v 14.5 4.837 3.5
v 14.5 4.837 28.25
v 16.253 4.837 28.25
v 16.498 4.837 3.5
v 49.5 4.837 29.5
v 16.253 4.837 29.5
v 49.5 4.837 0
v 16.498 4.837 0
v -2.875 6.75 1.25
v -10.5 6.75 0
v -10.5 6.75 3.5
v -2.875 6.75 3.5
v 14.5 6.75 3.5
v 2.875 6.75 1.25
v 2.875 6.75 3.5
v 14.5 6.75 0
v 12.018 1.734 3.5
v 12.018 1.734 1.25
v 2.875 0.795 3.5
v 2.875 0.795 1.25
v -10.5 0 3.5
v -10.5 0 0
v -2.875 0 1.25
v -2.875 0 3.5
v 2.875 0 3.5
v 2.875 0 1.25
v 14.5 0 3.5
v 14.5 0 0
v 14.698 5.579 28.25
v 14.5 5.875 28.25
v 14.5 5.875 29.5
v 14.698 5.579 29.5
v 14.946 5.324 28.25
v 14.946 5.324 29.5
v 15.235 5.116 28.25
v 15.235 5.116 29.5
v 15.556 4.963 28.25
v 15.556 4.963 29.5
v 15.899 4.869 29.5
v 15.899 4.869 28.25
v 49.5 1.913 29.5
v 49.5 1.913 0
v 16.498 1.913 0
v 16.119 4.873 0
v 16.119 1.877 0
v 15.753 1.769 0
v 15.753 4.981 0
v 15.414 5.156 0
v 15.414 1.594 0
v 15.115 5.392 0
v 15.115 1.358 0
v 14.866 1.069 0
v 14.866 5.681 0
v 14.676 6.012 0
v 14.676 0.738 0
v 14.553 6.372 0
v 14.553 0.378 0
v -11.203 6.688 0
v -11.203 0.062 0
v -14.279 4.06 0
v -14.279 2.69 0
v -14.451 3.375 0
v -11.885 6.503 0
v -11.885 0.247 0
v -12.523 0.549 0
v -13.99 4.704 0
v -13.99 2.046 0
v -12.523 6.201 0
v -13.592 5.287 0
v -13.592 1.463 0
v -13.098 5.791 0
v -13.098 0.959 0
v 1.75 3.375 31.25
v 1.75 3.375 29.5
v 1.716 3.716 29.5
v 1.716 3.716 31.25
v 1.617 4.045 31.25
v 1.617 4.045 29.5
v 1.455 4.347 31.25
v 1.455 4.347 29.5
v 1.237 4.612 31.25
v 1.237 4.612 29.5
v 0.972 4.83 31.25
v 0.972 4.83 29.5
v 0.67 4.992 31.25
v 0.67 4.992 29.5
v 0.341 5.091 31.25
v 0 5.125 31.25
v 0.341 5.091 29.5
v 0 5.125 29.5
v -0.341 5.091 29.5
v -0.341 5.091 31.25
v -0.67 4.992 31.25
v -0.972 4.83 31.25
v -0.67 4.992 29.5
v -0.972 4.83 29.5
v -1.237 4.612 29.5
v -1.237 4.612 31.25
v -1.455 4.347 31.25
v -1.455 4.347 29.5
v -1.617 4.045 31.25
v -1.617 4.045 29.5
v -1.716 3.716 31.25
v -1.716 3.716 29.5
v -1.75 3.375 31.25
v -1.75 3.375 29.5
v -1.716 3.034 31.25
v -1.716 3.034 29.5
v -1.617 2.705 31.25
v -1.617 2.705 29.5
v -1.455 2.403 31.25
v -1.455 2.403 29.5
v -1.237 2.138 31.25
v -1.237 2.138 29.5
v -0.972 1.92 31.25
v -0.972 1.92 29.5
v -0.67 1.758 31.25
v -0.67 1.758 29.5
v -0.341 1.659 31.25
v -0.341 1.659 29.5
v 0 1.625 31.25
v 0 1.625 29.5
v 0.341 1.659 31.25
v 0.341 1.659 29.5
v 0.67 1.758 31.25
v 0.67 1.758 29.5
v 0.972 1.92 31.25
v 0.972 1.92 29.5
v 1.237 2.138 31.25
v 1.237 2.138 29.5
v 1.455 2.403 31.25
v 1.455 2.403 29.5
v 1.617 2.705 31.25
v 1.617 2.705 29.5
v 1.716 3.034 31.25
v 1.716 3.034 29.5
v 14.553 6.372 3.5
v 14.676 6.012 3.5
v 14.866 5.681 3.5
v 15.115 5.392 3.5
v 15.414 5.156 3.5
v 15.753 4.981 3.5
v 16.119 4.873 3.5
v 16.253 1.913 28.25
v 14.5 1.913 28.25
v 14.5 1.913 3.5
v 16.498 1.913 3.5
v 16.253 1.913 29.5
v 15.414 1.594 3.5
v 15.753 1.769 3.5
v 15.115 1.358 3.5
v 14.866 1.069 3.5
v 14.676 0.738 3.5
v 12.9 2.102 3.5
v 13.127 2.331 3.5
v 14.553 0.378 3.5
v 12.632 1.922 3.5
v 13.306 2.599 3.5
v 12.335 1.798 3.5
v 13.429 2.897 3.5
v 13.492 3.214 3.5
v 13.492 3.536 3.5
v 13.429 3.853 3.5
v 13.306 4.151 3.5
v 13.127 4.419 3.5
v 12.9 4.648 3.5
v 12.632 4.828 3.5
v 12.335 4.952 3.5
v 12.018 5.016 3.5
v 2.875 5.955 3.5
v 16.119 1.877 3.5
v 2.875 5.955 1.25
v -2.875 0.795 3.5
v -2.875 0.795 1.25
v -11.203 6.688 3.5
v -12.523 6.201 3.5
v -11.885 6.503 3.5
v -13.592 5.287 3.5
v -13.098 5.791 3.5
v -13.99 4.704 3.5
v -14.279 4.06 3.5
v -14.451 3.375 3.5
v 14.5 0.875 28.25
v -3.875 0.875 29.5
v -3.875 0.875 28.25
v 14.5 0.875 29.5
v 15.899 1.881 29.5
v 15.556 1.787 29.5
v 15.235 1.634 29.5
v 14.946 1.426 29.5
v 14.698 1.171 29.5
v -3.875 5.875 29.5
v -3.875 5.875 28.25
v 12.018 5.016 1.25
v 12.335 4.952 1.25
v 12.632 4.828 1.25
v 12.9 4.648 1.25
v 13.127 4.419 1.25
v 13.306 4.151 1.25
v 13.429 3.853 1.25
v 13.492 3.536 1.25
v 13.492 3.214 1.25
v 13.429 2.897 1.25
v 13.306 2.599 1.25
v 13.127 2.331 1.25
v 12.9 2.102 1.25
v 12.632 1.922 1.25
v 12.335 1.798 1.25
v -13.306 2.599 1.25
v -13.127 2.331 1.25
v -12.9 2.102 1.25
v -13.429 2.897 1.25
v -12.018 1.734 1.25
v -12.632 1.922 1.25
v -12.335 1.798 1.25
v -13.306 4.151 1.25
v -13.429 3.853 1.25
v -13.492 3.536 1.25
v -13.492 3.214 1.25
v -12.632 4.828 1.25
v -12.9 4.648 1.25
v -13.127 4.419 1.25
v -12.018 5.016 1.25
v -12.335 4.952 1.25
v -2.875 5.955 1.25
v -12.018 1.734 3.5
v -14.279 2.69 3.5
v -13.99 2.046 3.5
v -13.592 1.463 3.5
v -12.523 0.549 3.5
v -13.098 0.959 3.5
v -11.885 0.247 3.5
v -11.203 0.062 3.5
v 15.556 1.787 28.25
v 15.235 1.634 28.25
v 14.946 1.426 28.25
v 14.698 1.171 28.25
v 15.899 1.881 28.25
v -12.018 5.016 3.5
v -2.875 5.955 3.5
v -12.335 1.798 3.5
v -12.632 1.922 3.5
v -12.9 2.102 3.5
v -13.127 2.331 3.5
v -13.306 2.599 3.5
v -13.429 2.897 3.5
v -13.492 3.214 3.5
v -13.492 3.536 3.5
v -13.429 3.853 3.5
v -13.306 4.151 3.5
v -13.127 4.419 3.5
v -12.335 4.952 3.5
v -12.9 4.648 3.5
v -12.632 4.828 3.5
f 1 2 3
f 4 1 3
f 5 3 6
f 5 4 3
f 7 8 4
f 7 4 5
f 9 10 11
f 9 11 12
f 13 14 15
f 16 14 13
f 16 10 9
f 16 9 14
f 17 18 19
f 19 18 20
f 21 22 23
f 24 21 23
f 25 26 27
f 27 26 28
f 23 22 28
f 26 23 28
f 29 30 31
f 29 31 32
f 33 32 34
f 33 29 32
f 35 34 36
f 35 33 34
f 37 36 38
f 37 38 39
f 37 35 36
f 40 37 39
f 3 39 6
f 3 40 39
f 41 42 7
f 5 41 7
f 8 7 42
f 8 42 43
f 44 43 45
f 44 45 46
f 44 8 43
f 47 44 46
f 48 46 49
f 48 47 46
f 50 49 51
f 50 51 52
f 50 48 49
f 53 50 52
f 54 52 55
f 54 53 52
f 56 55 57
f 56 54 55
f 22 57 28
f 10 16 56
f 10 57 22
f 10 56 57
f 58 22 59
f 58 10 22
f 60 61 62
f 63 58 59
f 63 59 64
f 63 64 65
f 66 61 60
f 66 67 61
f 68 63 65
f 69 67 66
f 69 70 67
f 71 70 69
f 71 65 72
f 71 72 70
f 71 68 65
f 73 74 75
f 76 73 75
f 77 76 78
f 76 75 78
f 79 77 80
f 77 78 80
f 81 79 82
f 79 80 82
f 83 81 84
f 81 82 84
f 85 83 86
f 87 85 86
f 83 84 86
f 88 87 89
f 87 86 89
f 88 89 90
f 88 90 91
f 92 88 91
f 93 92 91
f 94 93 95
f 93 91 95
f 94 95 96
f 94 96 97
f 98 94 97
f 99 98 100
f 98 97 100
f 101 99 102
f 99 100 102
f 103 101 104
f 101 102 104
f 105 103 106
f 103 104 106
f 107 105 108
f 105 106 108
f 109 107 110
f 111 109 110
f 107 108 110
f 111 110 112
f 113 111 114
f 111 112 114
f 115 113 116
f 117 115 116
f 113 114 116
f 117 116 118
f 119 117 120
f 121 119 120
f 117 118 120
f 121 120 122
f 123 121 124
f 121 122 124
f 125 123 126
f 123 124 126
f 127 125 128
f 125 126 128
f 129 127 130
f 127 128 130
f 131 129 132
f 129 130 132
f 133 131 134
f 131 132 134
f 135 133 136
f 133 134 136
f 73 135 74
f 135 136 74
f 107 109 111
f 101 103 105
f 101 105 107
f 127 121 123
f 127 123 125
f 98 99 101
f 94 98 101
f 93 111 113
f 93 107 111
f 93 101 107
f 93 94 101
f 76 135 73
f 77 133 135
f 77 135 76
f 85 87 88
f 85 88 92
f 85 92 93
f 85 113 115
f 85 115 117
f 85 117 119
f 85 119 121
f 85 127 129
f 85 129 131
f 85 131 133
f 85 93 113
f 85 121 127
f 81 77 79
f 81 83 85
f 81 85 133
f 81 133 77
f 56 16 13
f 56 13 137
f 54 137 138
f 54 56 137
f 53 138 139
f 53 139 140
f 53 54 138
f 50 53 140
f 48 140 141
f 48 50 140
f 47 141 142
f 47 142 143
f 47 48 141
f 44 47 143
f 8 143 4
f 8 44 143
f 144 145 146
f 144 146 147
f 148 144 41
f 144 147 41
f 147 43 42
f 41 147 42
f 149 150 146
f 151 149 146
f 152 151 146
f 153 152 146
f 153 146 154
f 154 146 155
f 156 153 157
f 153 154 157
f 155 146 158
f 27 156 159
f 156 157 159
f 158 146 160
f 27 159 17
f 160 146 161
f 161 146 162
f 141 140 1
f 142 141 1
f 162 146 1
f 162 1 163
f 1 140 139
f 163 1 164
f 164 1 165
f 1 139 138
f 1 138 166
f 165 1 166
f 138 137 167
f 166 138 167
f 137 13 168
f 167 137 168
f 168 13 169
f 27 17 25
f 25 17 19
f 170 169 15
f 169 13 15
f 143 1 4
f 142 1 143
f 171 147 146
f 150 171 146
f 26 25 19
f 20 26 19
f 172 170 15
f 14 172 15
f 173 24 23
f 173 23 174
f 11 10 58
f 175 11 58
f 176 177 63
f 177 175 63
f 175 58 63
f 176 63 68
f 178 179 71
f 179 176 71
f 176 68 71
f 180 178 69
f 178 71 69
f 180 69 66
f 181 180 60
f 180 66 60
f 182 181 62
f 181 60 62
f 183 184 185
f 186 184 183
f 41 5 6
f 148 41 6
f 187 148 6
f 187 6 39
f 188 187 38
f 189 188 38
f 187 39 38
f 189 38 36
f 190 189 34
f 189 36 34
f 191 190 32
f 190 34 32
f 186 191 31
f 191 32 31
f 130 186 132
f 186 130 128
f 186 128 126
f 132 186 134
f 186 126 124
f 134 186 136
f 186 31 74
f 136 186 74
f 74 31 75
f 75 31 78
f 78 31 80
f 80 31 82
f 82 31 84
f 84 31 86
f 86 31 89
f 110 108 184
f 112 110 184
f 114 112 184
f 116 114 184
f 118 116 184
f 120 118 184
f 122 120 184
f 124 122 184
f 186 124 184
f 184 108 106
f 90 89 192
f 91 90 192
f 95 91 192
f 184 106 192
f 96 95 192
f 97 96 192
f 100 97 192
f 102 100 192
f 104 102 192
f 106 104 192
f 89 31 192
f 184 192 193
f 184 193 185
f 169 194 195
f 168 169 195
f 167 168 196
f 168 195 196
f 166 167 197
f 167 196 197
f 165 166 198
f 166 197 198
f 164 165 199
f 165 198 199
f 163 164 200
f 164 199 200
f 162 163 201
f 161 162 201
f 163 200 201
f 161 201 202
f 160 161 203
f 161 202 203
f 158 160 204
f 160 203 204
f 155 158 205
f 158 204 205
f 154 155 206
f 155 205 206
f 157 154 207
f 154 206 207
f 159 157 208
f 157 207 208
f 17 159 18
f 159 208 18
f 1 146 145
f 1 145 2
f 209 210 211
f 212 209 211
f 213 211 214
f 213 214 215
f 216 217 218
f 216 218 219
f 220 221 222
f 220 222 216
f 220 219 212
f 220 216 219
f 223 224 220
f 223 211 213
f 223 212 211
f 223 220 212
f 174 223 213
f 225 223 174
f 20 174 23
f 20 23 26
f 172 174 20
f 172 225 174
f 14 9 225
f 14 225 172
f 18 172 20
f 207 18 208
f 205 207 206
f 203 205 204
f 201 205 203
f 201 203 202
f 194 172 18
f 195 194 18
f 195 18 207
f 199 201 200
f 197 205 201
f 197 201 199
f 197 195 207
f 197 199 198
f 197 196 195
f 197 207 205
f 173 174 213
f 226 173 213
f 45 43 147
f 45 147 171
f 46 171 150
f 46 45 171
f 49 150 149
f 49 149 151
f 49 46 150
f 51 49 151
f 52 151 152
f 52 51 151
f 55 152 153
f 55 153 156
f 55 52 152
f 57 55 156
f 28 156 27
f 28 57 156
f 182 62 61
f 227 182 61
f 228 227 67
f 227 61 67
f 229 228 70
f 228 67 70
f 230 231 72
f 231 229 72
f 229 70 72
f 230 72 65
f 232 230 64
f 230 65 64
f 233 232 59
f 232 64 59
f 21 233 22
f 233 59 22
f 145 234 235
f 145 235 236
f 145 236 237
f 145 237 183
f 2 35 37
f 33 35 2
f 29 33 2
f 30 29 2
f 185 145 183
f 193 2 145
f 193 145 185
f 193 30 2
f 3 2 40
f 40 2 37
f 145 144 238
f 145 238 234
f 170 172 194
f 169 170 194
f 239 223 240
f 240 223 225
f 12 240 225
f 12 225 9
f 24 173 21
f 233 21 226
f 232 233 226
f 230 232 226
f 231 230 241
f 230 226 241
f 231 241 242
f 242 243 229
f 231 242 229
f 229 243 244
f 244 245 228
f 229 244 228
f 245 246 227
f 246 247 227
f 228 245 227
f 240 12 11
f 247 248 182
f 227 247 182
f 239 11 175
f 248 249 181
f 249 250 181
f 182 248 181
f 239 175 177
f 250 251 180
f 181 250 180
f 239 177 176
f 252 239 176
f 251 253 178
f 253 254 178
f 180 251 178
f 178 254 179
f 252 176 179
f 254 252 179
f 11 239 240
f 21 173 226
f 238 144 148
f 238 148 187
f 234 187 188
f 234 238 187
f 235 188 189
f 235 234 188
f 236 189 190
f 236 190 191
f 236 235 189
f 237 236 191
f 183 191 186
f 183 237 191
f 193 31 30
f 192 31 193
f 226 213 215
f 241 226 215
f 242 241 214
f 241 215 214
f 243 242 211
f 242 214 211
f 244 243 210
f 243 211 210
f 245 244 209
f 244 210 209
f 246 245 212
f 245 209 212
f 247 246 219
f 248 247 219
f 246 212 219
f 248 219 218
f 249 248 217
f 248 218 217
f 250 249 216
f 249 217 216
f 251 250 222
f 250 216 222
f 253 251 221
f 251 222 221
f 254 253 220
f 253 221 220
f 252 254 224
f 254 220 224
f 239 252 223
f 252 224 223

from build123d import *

# Parameters (mm, degrees)
SKETCH1_W            = 29
SKETCH1_H            = 6.75
BOSS_EXTRUDE10_DEPTH = 3.5
SKETCH1_16_R         = 0.291434634
BOSS_EXTRUDE15_DEPTH = 1.25
SKETCH1_17_W         = 35
SKETCH1_17_H         = 2.924143722
BOSS_EXTRUDE17_DEPTH = 29.5
BOSS_EXTRUDE18_DEPTH = 1.25
SKETCH2_9_R          = 1.75
BOSS_EXTRUDE19_DEPTH = 1.75
FILLET1_R            = 2
FILLET2_R            = 4
SKETCH3_W            = 5.75
SKETCH3_H            = 0.795101344
CUT_EXTRUDE1_DEPTH   = 2.25


with BuildPart() as part:
    # Sketch1 → Boss-Extrude10 (new body)
    with BuildSketch(Plane.XY):
        with Locations((0, 3.375)):
            Rectangle(SKETCH1_W, SKETCH1_H)
        with BuildLine():
            Line((-12.018477316, 5.016376067), (0, 6.25))
            Line((0, 6.25), (12.018477316, 5.016376067))
            ThreePointArc((12.018477316, 5.016376067), (13.5, 3.375), (12.018477316, 1.733623933))
            Line((12.018477316, 1.733623933), (0, 0.5))
            Line((0, 0.5), (-12.018477316, 1.733623933))
            ThreePointArc((-12.018477316, 1.733623933), (-13.5, 3.375), (-12.018477316, 5.016376067))
        make_face(mode=Mode.SUBTRACT)
    extrude(amount=BOSS_EXTRUDE10_DEPTH)

    # Sketch1<16> → Boss-Extrude15 (add)
    # profile 1 of 9: a face of its own
    with BuildSketch(Plane.XY):
        with BuildLine():
            Line((-0.584049273, 6.190050878), (-12.018477316, 5.016376067))
            ThreePointArc((-12.018477316, 5.016376067), (-13.5, 3.375), (-12.018477316, 1.733623933))
            Line((-12.018477316, 1.733623933), (-0.584049273, 0.559949122))
            ThreePointArc((-0.584049273, 0.559949122), (-2.875, 3.375), (-0.584049273, 6.190050878))
        make_face()
        with Locations((-11.85, 3.375)):
            Circle(SKETCH1_16_R, mode=Mode.SUBTRACT)
        with Locations((-9.813185408, 3.375)):
            Circle(SKETCH1_16_R, mode=Mode.SUBTRACT)
        with Locations((-7.776370816, 3.375)):
            Circle(SKETCH1_16_R, mode=Mode.SUBTRACT)
    # profile 2 of 9: a face of its own
    with BuildSketch(Plane.XY):
        with Locations((-11.85, 3.375)):
            Circle(SKETCH1_16_R)
    # profile 3 of 9: a face of its own
    with BuildSketch(Plane.XY):
        with Locations((-7.776370816, 3.375)):
            Circle(SKETCH1_16_R)
    # profile 4 of 9: a face of its own
    with BuildSketch(Plane.XY):
        with Locations((-9.813185408, 3.375)):
            Circle(SKETCH1_16_R)
    # profile 5 of 9: a face of its own
    with BuildSketch(Plane.XY):
        with BuildLine():
            Line((0, 6.25), (-0.584049273, 6.190050878))
            ThreePointArc((-0.584049273, 6.190050878), (-2.875, 3.375), (-0.584049273, 0.559949122))
            Line((-0.584049273, 0.559949122), (0, 0.5))
            Line((0, 0.5), (0.584049273, 0.559949122))
            ThreePointArc((0.584049273, 0.559949122), (2.229884152, 1.56027091), (2.875, 3.375))
            ThreePointArc((2.875, 3.375), (2.229884152, 5.18972909), (0.584049273, 6.190050878))
            Line((0.584049273, 6.190050878), (0, 6.25))
        make_face()
    # profile 6 of 9: a face of its own
    with BuildSketch(Plane.XY):
        with BuildLine():
            Line((12.018477316, 5.016376067), (0.584049273, 6.190050878))
            ThreePointArc((0.584049273, 6.190050878), (2.229884152, 5.18972909), (2.875, 3.375))
            ThreePointArc((2.875, 3.375), (2.229884152, 1.56027091), (0.584049273, 0.559949122))
            Line((0.584049273, 0.559949122), (12.018477316, 1.733623933))
            ThreePointArc((12.018477316, 1.733623933), (13.5, 3.375), (12.018477316, 5.016376067))
        make_face()
        with Locations((7.776370816, 3.375)):
            Circle(SKETCH1_16_R, mode=Mode.SUBTRACT)
        with Locations((9.813185408, 3.375)):
            Circle(SKETCH1_16_R, mode=Mode.SUBTRACT)
        with Locations((11.85, 3.375)):
            Circle(SKETCH1_16_R, mode=Mode.SUBTRACT)
    # profile 7 of 9: a face of its own
    with BuildSketch(Plane.XY):
        with Locations((11.85, 3.375)):
            Circle(SKETCH1_16_R)
    # profile 8 of 9: a face of its own
    with BuildSketch(Plane.XY):
        with Locations((9.813185408, 3.375)):
            Circle(SKETCH1_16_R)
    # profile 9 of 9: a face of its own
    with BuildSketch(Plane.XY):
        with Locations((7.776370816, 3.375)):
            Circle(SKETCH1_16_R)
    extrude(amount=BOSS_EXTRUDE15_DEPTH)

    # Sketch1<17> → Boss-Extrude17 (add)
    with BuildSketch(Plane.XY):
        with Locations((32, 3.375)):
            Rectangle(SKETCH1_17_W, SKETCH1_17_H)
    extrude(amount=BOSS_EXTRUDE17_DEPTH)

    # Sketch2 → Boss-Extrude18 (add)
    with BuildSketch(Plane.XY.offset(29.5)):
        Polygon((13.5, 5.875), (-3.875, 5.875), (-3.875, 0.875), (14.5, 0.875), (14.5, 5.875), align=None)
    extrude(amount=-BOSS_EXTRUDE18_DEPTH)

    # Sketch2<9> → Boss-Extrude19 (add)
    with BuildSketch(Plane.XY.offset(29.5)):
        with Locations((0, 3.375)):
            Circle(SKETCH2_9_R)
    extrude(amount=BOSS_EXTRUDE19_DEPTH)

    # Fillet1
    # the kernel refuses this fillet: 2 mm, written as the material it adds along each edge
    with BuildSketch(Plane(origin=(14.5, 1.912928139, 0), x_dir=(0, -1, 0), z_dir=(0, 0, 1))) as fillet1_piece_1:
        with BuildLine():
            CenterArc((2, 1.998103724), FILLET1_R, 180, 87.504786267)
            Line((0, 1.998103724), (0, 0))
            Line((0, 0), (1.912928139, 0))
        make_face()
    extrude(amount=3.5)
    with BuildSketch(Plane(origin=(14.5, 4.837071861, 0), x_dir=(1, 0, 0), z_dir=(0, 0, 1))) as fillet1_piece_2:
        with BuildLine():
            CenterArc((1.998103724, 2), FILLET1_R, 182.495213733, 87.504786267)
            Line((0, 1.912928139), (0, 0))
            Line((0, 0), (1.998103724, 0))
        make_face()
    extrude(amount=3.5)
    with BuildSketch(Plane(origin=(14.5, 1.912928139, 28.25), x_dir=(1, 0, 0), z_dir=(0, 0, 1))) as fillet1_piece_3:
        with BuildLine():
            CenterArc((1.753401761, -2), FILLET1_R, 90, 61.246917848)
            Line((0, -1.037928139), (0, 0))
            Line((0, 0), (1.753401761, 0))
        make_face()
    extrude(amount=1.25)
    with BuildSketch(Plane(origin=(14.5, 4.837071861, 28.25), x_dir=(1, 0, 0), z_dir=(0, 0, 1))) as fillet1_piece_4:
        with BuildLine():
            CenterArc((1.753401761, 2), FILLET1_R, 208.753082152, 61.246917848)
            Line((0, 1.037928139), (0, 0))
            Line((0, 0), (1.753401761, 0))
        make_face()
    extrude(amount=1.25)

    # Fillet2
    # the kernel refuses this fillet: 4 mm, written as the material it takes off along each edge
    with BuildSketch(Plane(origin=(-14.5, 6.75, -10), x_dir=(0, -1, 0), z_dir=(0, 0, 1)), Plane(origin=(-14.5, 0, -10), x_dir=(1, 0, 0), z_dir=(0, 0, 1))) as fillet2_piece_1:
        with BuildLine():
            CenterArc((FILLET2_R, FILLET2_R), FILLET2_R, 180, 90)
            Line((0, FILLET2_R), (0, 0))
            Line((0, 0), (FILLET2_R, 0))
        make_face()
    extrude(amount=23.5, mode=Mode.SUBTRACT)

    # Sketch3 → Cut-Extrude1 (cut)
    with BuildSketch(Plane.XY.offset(3.5)):
        with Locations((0, 0.397550672)):
            Rectangle(SKETCH3_W, SKETCH3_H)
        with Locations((0, 6.352449328)):
            Rectangle(SKETCH3_W, SKETCH3_H)
    extrude(amount=-CUT_EXTRUDE1_DEPTH, mode=Mode.SUBTRACT)


solid = part.part
